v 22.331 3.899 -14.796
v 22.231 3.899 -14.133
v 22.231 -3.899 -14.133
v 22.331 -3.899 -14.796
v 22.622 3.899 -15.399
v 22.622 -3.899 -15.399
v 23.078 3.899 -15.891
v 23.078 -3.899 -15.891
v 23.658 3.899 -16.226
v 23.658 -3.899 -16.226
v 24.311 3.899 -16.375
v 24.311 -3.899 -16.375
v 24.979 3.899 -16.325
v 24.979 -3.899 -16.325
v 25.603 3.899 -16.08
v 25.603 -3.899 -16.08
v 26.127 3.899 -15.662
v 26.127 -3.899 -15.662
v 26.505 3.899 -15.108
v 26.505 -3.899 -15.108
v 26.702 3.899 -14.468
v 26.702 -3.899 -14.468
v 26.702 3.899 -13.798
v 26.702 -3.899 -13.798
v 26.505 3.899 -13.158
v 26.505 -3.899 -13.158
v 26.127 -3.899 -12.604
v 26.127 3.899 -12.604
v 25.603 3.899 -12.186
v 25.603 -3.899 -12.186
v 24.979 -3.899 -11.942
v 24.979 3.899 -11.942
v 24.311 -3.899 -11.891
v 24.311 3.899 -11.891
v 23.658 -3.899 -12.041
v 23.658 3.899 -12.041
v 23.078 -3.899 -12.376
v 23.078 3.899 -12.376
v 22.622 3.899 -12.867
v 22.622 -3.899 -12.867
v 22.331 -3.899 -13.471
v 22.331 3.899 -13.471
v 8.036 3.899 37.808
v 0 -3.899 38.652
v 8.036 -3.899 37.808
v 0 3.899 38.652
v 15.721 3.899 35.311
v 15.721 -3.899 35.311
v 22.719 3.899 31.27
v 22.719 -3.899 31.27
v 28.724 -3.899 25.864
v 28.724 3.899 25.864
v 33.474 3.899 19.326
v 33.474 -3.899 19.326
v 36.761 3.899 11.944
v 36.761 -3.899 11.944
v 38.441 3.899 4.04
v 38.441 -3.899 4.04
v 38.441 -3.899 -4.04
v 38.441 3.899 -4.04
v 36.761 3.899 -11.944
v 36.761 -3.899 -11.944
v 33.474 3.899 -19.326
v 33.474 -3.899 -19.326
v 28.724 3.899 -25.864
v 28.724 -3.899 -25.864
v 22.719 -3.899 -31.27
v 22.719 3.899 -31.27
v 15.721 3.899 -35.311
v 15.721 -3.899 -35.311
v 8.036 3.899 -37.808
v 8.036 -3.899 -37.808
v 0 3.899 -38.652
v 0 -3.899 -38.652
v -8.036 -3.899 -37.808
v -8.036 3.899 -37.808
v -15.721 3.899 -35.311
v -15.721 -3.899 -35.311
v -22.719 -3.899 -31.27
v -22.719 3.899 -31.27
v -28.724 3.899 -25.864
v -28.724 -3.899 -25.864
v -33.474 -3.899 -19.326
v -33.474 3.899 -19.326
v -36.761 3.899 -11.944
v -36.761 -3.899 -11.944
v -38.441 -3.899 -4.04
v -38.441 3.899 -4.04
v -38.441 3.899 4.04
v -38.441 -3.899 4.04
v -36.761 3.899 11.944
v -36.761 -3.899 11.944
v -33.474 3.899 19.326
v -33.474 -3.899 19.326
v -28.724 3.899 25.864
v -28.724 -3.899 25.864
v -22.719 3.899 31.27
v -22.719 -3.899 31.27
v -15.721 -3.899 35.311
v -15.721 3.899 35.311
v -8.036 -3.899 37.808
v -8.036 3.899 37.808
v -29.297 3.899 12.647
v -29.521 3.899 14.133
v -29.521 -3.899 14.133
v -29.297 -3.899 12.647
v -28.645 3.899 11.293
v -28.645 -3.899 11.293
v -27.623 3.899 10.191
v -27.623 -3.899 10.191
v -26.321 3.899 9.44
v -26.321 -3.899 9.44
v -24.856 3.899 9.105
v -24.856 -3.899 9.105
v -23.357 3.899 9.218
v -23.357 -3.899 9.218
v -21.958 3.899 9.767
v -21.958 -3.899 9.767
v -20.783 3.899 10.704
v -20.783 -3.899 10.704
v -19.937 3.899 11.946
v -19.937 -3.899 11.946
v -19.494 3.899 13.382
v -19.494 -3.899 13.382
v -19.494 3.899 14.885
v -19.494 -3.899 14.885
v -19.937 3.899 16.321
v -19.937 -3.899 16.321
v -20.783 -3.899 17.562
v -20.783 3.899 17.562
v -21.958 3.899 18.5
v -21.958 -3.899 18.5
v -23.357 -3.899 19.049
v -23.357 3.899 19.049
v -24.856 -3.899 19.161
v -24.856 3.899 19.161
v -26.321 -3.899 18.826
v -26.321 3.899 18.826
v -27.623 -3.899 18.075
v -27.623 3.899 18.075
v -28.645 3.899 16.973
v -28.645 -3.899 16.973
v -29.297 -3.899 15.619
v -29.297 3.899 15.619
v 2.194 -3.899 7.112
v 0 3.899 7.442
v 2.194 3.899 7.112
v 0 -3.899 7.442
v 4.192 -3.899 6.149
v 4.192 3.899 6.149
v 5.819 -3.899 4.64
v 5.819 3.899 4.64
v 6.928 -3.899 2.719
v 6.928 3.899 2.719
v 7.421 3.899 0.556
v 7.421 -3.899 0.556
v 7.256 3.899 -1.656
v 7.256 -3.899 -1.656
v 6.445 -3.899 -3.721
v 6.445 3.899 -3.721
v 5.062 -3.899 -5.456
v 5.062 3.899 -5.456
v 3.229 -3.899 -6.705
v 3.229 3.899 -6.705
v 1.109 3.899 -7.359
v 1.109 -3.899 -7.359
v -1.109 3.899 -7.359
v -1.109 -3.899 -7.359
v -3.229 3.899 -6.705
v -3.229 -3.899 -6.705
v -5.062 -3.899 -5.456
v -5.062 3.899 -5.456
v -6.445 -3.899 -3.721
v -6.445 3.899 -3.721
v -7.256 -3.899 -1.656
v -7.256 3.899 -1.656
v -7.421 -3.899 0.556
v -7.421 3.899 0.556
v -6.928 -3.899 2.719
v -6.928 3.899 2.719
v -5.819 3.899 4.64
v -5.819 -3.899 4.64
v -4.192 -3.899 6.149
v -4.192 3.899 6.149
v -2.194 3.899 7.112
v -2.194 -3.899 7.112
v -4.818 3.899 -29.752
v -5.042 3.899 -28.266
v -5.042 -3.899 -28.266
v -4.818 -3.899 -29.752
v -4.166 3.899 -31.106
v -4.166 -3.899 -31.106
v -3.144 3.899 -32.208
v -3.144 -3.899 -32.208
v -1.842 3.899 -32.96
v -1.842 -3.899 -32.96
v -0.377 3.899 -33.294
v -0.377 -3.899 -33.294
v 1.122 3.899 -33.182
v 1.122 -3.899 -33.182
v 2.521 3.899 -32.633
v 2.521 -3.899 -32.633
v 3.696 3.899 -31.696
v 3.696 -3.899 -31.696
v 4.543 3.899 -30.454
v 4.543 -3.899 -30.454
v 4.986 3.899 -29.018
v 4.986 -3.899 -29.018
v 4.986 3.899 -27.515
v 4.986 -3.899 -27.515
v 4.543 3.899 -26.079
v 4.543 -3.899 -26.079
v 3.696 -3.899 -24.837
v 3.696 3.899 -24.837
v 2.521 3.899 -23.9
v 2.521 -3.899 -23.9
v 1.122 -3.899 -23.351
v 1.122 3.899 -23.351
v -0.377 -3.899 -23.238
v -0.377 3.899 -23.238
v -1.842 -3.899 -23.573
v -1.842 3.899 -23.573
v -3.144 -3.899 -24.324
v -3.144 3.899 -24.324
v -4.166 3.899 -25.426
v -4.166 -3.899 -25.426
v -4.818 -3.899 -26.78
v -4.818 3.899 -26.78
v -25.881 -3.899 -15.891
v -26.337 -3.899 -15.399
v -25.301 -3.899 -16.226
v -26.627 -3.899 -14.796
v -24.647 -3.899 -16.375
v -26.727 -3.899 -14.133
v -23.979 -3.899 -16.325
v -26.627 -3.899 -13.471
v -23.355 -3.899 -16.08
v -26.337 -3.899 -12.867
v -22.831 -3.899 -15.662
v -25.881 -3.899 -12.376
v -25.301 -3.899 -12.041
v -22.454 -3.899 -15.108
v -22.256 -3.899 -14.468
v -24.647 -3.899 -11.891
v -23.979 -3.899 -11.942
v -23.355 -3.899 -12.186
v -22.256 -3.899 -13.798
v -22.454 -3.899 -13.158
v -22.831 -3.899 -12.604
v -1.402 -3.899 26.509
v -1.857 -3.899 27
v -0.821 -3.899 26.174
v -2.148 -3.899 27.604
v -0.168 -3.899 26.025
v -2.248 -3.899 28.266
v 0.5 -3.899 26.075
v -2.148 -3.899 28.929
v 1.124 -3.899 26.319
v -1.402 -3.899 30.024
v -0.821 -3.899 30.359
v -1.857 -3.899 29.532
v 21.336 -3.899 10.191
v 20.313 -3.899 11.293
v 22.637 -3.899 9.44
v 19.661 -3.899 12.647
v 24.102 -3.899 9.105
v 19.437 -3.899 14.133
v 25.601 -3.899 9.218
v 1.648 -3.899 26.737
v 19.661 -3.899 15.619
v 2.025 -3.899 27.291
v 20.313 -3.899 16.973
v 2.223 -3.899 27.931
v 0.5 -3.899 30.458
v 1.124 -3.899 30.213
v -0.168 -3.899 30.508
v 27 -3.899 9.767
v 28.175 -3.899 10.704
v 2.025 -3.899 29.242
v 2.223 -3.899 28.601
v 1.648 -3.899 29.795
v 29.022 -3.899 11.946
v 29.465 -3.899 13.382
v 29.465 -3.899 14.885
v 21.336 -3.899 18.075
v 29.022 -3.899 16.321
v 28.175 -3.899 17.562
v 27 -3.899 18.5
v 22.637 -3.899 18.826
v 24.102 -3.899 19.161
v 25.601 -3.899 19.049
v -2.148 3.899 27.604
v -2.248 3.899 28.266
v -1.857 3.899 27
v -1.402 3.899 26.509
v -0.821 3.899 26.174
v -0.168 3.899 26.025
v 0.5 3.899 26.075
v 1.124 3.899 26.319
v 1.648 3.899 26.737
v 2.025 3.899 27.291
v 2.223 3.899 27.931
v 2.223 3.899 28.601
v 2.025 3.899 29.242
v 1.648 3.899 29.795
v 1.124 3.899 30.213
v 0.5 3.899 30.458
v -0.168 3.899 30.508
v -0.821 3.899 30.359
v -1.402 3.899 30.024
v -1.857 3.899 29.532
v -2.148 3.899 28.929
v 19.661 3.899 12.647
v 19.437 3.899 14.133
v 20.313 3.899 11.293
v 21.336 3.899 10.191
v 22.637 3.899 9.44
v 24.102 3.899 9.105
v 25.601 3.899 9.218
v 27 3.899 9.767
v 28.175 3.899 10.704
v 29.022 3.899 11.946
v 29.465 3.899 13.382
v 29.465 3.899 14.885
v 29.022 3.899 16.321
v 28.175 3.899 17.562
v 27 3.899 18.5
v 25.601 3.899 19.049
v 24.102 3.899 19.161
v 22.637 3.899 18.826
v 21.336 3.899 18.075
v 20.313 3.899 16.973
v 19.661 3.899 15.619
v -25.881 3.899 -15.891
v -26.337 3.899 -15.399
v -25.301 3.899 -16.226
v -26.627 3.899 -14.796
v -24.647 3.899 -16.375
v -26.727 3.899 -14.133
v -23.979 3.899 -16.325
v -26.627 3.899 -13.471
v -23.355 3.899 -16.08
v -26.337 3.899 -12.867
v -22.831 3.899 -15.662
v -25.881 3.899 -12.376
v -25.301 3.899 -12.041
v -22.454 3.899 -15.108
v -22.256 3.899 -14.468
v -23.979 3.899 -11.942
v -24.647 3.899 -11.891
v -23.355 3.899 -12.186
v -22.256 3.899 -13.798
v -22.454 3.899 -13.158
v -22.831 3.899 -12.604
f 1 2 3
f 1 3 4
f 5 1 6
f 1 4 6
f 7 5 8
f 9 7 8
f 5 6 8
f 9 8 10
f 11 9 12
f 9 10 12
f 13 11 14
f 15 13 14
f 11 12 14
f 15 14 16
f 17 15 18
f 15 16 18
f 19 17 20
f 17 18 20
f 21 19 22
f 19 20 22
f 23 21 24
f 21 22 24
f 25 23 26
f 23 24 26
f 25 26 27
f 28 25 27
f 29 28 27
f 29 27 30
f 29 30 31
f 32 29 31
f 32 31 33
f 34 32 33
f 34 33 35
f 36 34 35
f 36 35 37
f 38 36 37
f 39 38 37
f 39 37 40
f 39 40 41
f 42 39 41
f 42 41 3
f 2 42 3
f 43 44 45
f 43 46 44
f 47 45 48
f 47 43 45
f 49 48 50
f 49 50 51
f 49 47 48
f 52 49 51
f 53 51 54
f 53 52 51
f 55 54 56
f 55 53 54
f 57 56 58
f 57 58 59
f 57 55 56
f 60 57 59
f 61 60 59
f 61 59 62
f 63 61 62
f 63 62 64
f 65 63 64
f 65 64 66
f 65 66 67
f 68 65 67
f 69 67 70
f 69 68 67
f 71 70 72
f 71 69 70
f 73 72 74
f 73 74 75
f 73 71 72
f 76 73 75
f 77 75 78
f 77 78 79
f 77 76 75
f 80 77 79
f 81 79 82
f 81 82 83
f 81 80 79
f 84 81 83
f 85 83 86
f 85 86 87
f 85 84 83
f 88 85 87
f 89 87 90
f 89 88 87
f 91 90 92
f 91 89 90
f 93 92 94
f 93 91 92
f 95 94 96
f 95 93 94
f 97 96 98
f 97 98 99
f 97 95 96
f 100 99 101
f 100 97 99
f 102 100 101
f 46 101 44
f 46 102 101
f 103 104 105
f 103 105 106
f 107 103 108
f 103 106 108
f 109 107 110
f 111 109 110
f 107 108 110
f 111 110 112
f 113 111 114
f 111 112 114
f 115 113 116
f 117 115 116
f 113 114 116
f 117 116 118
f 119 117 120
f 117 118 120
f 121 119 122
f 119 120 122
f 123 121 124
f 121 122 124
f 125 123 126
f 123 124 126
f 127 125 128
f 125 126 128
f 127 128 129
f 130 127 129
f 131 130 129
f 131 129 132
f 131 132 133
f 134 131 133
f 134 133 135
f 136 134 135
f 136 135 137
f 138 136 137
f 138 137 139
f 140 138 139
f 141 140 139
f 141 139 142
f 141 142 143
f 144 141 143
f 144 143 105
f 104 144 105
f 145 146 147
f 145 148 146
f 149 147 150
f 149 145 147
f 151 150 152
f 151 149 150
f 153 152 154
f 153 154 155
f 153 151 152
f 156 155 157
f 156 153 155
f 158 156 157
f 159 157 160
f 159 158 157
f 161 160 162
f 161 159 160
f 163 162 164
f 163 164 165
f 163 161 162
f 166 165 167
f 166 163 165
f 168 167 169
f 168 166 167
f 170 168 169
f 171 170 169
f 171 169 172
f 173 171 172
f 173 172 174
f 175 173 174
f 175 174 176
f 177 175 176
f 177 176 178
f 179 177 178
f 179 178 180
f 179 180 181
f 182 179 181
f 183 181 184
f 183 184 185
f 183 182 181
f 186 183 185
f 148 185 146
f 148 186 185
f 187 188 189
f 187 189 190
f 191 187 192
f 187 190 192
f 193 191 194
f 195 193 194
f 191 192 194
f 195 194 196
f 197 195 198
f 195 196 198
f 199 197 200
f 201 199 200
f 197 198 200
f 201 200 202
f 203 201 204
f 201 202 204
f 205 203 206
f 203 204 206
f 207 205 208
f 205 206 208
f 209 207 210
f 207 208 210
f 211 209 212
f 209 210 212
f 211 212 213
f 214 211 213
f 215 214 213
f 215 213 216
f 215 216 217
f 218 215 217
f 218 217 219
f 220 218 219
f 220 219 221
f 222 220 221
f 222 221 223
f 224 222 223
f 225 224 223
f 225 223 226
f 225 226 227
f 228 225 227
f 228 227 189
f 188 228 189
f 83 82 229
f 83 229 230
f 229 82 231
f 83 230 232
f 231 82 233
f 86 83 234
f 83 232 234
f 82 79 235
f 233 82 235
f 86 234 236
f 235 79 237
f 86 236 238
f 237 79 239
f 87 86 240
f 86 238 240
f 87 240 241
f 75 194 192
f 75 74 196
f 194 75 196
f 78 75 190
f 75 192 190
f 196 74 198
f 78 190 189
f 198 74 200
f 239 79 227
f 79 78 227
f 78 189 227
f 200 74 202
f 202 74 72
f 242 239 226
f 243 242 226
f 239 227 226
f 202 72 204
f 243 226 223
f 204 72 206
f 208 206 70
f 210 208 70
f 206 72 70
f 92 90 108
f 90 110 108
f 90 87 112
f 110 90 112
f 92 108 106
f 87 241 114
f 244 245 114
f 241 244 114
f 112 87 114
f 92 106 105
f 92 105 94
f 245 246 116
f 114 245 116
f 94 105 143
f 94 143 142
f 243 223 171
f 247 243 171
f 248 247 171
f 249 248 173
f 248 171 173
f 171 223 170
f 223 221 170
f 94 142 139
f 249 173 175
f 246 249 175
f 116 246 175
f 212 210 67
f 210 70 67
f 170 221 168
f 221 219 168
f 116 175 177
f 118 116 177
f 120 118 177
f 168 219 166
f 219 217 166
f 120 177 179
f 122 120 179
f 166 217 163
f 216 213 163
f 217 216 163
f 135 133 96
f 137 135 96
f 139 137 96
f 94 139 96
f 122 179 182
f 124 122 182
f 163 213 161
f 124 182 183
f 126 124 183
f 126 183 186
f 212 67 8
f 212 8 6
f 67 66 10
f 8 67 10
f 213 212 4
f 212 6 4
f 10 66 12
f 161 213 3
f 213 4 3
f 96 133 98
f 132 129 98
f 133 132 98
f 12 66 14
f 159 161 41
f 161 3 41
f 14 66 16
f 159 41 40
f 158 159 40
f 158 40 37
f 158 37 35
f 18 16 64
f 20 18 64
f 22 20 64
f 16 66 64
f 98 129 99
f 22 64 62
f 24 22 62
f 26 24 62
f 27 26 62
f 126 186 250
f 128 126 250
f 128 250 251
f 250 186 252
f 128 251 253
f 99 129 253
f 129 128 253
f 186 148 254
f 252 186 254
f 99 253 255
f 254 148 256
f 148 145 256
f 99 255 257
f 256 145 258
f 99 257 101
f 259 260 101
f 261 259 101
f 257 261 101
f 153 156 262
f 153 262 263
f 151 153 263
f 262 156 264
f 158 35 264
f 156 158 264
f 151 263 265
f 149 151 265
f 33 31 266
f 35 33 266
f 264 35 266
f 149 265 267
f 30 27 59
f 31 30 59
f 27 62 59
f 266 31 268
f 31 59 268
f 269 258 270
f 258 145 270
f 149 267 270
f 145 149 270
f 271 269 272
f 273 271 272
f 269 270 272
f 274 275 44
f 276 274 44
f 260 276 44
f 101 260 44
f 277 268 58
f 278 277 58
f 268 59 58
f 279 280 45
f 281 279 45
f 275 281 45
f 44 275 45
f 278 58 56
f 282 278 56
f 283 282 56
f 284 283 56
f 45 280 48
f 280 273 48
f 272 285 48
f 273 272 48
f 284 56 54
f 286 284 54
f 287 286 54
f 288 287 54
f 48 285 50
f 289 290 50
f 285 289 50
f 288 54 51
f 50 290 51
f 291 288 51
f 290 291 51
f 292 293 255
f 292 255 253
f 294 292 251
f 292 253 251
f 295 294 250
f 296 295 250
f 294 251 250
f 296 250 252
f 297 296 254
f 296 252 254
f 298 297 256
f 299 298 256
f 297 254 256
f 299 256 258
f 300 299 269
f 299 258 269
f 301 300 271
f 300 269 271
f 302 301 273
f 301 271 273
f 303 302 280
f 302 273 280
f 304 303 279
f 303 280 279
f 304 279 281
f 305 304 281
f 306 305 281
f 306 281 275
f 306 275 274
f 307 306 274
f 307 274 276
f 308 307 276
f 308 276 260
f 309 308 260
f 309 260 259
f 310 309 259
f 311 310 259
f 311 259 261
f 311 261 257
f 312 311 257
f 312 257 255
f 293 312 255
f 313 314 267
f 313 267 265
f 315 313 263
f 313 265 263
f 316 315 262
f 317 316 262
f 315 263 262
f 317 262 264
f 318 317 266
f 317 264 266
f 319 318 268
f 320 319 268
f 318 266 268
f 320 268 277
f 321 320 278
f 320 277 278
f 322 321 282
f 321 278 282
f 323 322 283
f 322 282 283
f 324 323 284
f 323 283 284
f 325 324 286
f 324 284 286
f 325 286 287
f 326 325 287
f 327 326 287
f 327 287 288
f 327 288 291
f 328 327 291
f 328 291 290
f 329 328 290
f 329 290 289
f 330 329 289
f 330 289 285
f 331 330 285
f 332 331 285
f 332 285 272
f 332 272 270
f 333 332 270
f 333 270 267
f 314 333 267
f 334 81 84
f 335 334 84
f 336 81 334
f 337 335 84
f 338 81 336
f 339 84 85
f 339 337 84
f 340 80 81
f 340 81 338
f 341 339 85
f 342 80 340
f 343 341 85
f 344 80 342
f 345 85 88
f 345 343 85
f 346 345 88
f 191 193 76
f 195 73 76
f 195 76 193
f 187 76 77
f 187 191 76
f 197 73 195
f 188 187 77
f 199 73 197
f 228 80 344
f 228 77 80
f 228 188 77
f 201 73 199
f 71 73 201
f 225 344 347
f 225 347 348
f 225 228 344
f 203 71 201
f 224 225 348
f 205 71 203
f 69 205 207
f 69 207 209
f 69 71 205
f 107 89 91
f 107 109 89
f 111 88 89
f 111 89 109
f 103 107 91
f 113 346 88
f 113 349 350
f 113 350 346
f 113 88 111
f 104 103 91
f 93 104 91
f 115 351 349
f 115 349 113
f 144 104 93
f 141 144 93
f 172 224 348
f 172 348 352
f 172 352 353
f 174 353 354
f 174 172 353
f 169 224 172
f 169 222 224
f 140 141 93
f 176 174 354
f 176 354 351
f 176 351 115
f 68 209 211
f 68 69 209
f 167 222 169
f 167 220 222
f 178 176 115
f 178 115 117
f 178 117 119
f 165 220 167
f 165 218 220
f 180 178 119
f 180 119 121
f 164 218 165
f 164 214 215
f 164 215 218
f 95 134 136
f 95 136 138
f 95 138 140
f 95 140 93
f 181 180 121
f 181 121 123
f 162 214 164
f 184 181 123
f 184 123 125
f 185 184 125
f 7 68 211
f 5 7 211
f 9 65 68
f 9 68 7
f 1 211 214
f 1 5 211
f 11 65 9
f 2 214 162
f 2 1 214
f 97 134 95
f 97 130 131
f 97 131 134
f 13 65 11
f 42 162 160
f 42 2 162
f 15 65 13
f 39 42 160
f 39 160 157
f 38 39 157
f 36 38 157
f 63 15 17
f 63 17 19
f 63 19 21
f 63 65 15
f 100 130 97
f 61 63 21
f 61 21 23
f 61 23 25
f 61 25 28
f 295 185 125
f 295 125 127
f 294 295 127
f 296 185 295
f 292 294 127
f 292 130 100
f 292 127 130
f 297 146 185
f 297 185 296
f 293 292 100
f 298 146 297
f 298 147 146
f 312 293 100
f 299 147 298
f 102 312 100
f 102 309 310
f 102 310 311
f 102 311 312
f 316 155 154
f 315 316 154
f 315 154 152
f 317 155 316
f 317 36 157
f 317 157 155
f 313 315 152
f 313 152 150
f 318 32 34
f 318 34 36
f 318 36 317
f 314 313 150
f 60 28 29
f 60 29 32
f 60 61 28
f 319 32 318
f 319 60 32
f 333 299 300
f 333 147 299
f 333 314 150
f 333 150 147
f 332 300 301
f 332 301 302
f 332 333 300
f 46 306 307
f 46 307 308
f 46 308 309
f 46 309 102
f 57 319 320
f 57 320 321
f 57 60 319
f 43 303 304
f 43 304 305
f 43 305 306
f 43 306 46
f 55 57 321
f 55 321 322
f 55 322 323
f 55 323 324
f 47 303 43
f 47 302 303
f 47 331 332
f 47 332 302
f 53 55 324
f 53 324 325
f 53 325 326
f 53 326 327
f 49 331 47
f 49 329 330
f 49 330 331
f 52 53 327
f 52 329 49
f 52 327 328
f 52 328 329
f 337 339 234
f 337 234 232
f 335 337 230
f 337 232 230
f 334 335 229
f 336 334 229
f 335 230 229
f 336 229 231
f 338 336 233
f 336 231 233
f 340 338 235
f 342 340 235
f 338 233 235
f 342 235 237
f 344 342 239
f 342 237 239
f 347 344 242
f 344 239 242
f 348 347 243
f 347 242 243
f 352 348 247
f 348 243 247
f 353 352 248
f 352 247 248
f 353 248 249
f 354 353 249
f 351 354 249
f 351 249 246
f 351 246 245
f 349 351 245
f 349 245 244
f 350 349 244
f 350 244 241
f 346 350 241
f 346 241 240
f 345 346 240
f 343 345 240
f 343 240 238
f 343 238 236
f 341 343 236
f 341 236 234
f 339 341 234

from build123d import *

# Parameters (mm, degrees)
SKETCH1_R               = 38.65245
SKETCH1_R_2             = 7.4422
BOSS_EXTRUDE1_DEPTH     = 3.8989
F_3_8_CLEARANCE_HOLE1_D = 10.0838
F_8_CLEARANCE_HOLE1_D   = 4.4958


with BuildPart() as part:
    # Sketch1 → Boss-Extrude1 (new, symmetric)
    with BuildSketch(Plane(origin=(0, 0, 0), x_dir=(1, 0, 0), z_dir=(0, 1, 0))):
        with Locations(Location((0, 0, 0), (0, 0, 270))):
            Circle(SKETCH1_R)
        with Locations(Location((0, 0, 0), (0, 0, 270))):
            Circle(SKETCH1_R_2, mode=Mode.SUBTRACT)
    extrude(amount=BOSS_EXTRUDE1_DEPTH, both=True)

    # 3/8 Clearance Hole1 (through all)
    with Locations(Plane(origin=(0, 3.8989, 0), x_dir=(1, 0, 0), z_dir=(0, 1, 0))):
        with Locations((0, 28.266203154), (24.47925, -14.133101577), (-24.47925, -14.133101577)):
            Hole(F_3_8_CLEARANCE_HOLE1_D / 2)

    # #8 Clearance Hole1 (through all)
    with Locations(Plane(origin=(0, 3.8989, 0), x_dir=(1, 0, 0), z_dir=(0, 1, 0))):
        with Locations((24.47925, 14.133101577), (0, -28.266203154), (-24.47925, 14.133101577)):
            Hole(F_8_CLEARANCE_HOLE1_D / 2)


solid = part.part
